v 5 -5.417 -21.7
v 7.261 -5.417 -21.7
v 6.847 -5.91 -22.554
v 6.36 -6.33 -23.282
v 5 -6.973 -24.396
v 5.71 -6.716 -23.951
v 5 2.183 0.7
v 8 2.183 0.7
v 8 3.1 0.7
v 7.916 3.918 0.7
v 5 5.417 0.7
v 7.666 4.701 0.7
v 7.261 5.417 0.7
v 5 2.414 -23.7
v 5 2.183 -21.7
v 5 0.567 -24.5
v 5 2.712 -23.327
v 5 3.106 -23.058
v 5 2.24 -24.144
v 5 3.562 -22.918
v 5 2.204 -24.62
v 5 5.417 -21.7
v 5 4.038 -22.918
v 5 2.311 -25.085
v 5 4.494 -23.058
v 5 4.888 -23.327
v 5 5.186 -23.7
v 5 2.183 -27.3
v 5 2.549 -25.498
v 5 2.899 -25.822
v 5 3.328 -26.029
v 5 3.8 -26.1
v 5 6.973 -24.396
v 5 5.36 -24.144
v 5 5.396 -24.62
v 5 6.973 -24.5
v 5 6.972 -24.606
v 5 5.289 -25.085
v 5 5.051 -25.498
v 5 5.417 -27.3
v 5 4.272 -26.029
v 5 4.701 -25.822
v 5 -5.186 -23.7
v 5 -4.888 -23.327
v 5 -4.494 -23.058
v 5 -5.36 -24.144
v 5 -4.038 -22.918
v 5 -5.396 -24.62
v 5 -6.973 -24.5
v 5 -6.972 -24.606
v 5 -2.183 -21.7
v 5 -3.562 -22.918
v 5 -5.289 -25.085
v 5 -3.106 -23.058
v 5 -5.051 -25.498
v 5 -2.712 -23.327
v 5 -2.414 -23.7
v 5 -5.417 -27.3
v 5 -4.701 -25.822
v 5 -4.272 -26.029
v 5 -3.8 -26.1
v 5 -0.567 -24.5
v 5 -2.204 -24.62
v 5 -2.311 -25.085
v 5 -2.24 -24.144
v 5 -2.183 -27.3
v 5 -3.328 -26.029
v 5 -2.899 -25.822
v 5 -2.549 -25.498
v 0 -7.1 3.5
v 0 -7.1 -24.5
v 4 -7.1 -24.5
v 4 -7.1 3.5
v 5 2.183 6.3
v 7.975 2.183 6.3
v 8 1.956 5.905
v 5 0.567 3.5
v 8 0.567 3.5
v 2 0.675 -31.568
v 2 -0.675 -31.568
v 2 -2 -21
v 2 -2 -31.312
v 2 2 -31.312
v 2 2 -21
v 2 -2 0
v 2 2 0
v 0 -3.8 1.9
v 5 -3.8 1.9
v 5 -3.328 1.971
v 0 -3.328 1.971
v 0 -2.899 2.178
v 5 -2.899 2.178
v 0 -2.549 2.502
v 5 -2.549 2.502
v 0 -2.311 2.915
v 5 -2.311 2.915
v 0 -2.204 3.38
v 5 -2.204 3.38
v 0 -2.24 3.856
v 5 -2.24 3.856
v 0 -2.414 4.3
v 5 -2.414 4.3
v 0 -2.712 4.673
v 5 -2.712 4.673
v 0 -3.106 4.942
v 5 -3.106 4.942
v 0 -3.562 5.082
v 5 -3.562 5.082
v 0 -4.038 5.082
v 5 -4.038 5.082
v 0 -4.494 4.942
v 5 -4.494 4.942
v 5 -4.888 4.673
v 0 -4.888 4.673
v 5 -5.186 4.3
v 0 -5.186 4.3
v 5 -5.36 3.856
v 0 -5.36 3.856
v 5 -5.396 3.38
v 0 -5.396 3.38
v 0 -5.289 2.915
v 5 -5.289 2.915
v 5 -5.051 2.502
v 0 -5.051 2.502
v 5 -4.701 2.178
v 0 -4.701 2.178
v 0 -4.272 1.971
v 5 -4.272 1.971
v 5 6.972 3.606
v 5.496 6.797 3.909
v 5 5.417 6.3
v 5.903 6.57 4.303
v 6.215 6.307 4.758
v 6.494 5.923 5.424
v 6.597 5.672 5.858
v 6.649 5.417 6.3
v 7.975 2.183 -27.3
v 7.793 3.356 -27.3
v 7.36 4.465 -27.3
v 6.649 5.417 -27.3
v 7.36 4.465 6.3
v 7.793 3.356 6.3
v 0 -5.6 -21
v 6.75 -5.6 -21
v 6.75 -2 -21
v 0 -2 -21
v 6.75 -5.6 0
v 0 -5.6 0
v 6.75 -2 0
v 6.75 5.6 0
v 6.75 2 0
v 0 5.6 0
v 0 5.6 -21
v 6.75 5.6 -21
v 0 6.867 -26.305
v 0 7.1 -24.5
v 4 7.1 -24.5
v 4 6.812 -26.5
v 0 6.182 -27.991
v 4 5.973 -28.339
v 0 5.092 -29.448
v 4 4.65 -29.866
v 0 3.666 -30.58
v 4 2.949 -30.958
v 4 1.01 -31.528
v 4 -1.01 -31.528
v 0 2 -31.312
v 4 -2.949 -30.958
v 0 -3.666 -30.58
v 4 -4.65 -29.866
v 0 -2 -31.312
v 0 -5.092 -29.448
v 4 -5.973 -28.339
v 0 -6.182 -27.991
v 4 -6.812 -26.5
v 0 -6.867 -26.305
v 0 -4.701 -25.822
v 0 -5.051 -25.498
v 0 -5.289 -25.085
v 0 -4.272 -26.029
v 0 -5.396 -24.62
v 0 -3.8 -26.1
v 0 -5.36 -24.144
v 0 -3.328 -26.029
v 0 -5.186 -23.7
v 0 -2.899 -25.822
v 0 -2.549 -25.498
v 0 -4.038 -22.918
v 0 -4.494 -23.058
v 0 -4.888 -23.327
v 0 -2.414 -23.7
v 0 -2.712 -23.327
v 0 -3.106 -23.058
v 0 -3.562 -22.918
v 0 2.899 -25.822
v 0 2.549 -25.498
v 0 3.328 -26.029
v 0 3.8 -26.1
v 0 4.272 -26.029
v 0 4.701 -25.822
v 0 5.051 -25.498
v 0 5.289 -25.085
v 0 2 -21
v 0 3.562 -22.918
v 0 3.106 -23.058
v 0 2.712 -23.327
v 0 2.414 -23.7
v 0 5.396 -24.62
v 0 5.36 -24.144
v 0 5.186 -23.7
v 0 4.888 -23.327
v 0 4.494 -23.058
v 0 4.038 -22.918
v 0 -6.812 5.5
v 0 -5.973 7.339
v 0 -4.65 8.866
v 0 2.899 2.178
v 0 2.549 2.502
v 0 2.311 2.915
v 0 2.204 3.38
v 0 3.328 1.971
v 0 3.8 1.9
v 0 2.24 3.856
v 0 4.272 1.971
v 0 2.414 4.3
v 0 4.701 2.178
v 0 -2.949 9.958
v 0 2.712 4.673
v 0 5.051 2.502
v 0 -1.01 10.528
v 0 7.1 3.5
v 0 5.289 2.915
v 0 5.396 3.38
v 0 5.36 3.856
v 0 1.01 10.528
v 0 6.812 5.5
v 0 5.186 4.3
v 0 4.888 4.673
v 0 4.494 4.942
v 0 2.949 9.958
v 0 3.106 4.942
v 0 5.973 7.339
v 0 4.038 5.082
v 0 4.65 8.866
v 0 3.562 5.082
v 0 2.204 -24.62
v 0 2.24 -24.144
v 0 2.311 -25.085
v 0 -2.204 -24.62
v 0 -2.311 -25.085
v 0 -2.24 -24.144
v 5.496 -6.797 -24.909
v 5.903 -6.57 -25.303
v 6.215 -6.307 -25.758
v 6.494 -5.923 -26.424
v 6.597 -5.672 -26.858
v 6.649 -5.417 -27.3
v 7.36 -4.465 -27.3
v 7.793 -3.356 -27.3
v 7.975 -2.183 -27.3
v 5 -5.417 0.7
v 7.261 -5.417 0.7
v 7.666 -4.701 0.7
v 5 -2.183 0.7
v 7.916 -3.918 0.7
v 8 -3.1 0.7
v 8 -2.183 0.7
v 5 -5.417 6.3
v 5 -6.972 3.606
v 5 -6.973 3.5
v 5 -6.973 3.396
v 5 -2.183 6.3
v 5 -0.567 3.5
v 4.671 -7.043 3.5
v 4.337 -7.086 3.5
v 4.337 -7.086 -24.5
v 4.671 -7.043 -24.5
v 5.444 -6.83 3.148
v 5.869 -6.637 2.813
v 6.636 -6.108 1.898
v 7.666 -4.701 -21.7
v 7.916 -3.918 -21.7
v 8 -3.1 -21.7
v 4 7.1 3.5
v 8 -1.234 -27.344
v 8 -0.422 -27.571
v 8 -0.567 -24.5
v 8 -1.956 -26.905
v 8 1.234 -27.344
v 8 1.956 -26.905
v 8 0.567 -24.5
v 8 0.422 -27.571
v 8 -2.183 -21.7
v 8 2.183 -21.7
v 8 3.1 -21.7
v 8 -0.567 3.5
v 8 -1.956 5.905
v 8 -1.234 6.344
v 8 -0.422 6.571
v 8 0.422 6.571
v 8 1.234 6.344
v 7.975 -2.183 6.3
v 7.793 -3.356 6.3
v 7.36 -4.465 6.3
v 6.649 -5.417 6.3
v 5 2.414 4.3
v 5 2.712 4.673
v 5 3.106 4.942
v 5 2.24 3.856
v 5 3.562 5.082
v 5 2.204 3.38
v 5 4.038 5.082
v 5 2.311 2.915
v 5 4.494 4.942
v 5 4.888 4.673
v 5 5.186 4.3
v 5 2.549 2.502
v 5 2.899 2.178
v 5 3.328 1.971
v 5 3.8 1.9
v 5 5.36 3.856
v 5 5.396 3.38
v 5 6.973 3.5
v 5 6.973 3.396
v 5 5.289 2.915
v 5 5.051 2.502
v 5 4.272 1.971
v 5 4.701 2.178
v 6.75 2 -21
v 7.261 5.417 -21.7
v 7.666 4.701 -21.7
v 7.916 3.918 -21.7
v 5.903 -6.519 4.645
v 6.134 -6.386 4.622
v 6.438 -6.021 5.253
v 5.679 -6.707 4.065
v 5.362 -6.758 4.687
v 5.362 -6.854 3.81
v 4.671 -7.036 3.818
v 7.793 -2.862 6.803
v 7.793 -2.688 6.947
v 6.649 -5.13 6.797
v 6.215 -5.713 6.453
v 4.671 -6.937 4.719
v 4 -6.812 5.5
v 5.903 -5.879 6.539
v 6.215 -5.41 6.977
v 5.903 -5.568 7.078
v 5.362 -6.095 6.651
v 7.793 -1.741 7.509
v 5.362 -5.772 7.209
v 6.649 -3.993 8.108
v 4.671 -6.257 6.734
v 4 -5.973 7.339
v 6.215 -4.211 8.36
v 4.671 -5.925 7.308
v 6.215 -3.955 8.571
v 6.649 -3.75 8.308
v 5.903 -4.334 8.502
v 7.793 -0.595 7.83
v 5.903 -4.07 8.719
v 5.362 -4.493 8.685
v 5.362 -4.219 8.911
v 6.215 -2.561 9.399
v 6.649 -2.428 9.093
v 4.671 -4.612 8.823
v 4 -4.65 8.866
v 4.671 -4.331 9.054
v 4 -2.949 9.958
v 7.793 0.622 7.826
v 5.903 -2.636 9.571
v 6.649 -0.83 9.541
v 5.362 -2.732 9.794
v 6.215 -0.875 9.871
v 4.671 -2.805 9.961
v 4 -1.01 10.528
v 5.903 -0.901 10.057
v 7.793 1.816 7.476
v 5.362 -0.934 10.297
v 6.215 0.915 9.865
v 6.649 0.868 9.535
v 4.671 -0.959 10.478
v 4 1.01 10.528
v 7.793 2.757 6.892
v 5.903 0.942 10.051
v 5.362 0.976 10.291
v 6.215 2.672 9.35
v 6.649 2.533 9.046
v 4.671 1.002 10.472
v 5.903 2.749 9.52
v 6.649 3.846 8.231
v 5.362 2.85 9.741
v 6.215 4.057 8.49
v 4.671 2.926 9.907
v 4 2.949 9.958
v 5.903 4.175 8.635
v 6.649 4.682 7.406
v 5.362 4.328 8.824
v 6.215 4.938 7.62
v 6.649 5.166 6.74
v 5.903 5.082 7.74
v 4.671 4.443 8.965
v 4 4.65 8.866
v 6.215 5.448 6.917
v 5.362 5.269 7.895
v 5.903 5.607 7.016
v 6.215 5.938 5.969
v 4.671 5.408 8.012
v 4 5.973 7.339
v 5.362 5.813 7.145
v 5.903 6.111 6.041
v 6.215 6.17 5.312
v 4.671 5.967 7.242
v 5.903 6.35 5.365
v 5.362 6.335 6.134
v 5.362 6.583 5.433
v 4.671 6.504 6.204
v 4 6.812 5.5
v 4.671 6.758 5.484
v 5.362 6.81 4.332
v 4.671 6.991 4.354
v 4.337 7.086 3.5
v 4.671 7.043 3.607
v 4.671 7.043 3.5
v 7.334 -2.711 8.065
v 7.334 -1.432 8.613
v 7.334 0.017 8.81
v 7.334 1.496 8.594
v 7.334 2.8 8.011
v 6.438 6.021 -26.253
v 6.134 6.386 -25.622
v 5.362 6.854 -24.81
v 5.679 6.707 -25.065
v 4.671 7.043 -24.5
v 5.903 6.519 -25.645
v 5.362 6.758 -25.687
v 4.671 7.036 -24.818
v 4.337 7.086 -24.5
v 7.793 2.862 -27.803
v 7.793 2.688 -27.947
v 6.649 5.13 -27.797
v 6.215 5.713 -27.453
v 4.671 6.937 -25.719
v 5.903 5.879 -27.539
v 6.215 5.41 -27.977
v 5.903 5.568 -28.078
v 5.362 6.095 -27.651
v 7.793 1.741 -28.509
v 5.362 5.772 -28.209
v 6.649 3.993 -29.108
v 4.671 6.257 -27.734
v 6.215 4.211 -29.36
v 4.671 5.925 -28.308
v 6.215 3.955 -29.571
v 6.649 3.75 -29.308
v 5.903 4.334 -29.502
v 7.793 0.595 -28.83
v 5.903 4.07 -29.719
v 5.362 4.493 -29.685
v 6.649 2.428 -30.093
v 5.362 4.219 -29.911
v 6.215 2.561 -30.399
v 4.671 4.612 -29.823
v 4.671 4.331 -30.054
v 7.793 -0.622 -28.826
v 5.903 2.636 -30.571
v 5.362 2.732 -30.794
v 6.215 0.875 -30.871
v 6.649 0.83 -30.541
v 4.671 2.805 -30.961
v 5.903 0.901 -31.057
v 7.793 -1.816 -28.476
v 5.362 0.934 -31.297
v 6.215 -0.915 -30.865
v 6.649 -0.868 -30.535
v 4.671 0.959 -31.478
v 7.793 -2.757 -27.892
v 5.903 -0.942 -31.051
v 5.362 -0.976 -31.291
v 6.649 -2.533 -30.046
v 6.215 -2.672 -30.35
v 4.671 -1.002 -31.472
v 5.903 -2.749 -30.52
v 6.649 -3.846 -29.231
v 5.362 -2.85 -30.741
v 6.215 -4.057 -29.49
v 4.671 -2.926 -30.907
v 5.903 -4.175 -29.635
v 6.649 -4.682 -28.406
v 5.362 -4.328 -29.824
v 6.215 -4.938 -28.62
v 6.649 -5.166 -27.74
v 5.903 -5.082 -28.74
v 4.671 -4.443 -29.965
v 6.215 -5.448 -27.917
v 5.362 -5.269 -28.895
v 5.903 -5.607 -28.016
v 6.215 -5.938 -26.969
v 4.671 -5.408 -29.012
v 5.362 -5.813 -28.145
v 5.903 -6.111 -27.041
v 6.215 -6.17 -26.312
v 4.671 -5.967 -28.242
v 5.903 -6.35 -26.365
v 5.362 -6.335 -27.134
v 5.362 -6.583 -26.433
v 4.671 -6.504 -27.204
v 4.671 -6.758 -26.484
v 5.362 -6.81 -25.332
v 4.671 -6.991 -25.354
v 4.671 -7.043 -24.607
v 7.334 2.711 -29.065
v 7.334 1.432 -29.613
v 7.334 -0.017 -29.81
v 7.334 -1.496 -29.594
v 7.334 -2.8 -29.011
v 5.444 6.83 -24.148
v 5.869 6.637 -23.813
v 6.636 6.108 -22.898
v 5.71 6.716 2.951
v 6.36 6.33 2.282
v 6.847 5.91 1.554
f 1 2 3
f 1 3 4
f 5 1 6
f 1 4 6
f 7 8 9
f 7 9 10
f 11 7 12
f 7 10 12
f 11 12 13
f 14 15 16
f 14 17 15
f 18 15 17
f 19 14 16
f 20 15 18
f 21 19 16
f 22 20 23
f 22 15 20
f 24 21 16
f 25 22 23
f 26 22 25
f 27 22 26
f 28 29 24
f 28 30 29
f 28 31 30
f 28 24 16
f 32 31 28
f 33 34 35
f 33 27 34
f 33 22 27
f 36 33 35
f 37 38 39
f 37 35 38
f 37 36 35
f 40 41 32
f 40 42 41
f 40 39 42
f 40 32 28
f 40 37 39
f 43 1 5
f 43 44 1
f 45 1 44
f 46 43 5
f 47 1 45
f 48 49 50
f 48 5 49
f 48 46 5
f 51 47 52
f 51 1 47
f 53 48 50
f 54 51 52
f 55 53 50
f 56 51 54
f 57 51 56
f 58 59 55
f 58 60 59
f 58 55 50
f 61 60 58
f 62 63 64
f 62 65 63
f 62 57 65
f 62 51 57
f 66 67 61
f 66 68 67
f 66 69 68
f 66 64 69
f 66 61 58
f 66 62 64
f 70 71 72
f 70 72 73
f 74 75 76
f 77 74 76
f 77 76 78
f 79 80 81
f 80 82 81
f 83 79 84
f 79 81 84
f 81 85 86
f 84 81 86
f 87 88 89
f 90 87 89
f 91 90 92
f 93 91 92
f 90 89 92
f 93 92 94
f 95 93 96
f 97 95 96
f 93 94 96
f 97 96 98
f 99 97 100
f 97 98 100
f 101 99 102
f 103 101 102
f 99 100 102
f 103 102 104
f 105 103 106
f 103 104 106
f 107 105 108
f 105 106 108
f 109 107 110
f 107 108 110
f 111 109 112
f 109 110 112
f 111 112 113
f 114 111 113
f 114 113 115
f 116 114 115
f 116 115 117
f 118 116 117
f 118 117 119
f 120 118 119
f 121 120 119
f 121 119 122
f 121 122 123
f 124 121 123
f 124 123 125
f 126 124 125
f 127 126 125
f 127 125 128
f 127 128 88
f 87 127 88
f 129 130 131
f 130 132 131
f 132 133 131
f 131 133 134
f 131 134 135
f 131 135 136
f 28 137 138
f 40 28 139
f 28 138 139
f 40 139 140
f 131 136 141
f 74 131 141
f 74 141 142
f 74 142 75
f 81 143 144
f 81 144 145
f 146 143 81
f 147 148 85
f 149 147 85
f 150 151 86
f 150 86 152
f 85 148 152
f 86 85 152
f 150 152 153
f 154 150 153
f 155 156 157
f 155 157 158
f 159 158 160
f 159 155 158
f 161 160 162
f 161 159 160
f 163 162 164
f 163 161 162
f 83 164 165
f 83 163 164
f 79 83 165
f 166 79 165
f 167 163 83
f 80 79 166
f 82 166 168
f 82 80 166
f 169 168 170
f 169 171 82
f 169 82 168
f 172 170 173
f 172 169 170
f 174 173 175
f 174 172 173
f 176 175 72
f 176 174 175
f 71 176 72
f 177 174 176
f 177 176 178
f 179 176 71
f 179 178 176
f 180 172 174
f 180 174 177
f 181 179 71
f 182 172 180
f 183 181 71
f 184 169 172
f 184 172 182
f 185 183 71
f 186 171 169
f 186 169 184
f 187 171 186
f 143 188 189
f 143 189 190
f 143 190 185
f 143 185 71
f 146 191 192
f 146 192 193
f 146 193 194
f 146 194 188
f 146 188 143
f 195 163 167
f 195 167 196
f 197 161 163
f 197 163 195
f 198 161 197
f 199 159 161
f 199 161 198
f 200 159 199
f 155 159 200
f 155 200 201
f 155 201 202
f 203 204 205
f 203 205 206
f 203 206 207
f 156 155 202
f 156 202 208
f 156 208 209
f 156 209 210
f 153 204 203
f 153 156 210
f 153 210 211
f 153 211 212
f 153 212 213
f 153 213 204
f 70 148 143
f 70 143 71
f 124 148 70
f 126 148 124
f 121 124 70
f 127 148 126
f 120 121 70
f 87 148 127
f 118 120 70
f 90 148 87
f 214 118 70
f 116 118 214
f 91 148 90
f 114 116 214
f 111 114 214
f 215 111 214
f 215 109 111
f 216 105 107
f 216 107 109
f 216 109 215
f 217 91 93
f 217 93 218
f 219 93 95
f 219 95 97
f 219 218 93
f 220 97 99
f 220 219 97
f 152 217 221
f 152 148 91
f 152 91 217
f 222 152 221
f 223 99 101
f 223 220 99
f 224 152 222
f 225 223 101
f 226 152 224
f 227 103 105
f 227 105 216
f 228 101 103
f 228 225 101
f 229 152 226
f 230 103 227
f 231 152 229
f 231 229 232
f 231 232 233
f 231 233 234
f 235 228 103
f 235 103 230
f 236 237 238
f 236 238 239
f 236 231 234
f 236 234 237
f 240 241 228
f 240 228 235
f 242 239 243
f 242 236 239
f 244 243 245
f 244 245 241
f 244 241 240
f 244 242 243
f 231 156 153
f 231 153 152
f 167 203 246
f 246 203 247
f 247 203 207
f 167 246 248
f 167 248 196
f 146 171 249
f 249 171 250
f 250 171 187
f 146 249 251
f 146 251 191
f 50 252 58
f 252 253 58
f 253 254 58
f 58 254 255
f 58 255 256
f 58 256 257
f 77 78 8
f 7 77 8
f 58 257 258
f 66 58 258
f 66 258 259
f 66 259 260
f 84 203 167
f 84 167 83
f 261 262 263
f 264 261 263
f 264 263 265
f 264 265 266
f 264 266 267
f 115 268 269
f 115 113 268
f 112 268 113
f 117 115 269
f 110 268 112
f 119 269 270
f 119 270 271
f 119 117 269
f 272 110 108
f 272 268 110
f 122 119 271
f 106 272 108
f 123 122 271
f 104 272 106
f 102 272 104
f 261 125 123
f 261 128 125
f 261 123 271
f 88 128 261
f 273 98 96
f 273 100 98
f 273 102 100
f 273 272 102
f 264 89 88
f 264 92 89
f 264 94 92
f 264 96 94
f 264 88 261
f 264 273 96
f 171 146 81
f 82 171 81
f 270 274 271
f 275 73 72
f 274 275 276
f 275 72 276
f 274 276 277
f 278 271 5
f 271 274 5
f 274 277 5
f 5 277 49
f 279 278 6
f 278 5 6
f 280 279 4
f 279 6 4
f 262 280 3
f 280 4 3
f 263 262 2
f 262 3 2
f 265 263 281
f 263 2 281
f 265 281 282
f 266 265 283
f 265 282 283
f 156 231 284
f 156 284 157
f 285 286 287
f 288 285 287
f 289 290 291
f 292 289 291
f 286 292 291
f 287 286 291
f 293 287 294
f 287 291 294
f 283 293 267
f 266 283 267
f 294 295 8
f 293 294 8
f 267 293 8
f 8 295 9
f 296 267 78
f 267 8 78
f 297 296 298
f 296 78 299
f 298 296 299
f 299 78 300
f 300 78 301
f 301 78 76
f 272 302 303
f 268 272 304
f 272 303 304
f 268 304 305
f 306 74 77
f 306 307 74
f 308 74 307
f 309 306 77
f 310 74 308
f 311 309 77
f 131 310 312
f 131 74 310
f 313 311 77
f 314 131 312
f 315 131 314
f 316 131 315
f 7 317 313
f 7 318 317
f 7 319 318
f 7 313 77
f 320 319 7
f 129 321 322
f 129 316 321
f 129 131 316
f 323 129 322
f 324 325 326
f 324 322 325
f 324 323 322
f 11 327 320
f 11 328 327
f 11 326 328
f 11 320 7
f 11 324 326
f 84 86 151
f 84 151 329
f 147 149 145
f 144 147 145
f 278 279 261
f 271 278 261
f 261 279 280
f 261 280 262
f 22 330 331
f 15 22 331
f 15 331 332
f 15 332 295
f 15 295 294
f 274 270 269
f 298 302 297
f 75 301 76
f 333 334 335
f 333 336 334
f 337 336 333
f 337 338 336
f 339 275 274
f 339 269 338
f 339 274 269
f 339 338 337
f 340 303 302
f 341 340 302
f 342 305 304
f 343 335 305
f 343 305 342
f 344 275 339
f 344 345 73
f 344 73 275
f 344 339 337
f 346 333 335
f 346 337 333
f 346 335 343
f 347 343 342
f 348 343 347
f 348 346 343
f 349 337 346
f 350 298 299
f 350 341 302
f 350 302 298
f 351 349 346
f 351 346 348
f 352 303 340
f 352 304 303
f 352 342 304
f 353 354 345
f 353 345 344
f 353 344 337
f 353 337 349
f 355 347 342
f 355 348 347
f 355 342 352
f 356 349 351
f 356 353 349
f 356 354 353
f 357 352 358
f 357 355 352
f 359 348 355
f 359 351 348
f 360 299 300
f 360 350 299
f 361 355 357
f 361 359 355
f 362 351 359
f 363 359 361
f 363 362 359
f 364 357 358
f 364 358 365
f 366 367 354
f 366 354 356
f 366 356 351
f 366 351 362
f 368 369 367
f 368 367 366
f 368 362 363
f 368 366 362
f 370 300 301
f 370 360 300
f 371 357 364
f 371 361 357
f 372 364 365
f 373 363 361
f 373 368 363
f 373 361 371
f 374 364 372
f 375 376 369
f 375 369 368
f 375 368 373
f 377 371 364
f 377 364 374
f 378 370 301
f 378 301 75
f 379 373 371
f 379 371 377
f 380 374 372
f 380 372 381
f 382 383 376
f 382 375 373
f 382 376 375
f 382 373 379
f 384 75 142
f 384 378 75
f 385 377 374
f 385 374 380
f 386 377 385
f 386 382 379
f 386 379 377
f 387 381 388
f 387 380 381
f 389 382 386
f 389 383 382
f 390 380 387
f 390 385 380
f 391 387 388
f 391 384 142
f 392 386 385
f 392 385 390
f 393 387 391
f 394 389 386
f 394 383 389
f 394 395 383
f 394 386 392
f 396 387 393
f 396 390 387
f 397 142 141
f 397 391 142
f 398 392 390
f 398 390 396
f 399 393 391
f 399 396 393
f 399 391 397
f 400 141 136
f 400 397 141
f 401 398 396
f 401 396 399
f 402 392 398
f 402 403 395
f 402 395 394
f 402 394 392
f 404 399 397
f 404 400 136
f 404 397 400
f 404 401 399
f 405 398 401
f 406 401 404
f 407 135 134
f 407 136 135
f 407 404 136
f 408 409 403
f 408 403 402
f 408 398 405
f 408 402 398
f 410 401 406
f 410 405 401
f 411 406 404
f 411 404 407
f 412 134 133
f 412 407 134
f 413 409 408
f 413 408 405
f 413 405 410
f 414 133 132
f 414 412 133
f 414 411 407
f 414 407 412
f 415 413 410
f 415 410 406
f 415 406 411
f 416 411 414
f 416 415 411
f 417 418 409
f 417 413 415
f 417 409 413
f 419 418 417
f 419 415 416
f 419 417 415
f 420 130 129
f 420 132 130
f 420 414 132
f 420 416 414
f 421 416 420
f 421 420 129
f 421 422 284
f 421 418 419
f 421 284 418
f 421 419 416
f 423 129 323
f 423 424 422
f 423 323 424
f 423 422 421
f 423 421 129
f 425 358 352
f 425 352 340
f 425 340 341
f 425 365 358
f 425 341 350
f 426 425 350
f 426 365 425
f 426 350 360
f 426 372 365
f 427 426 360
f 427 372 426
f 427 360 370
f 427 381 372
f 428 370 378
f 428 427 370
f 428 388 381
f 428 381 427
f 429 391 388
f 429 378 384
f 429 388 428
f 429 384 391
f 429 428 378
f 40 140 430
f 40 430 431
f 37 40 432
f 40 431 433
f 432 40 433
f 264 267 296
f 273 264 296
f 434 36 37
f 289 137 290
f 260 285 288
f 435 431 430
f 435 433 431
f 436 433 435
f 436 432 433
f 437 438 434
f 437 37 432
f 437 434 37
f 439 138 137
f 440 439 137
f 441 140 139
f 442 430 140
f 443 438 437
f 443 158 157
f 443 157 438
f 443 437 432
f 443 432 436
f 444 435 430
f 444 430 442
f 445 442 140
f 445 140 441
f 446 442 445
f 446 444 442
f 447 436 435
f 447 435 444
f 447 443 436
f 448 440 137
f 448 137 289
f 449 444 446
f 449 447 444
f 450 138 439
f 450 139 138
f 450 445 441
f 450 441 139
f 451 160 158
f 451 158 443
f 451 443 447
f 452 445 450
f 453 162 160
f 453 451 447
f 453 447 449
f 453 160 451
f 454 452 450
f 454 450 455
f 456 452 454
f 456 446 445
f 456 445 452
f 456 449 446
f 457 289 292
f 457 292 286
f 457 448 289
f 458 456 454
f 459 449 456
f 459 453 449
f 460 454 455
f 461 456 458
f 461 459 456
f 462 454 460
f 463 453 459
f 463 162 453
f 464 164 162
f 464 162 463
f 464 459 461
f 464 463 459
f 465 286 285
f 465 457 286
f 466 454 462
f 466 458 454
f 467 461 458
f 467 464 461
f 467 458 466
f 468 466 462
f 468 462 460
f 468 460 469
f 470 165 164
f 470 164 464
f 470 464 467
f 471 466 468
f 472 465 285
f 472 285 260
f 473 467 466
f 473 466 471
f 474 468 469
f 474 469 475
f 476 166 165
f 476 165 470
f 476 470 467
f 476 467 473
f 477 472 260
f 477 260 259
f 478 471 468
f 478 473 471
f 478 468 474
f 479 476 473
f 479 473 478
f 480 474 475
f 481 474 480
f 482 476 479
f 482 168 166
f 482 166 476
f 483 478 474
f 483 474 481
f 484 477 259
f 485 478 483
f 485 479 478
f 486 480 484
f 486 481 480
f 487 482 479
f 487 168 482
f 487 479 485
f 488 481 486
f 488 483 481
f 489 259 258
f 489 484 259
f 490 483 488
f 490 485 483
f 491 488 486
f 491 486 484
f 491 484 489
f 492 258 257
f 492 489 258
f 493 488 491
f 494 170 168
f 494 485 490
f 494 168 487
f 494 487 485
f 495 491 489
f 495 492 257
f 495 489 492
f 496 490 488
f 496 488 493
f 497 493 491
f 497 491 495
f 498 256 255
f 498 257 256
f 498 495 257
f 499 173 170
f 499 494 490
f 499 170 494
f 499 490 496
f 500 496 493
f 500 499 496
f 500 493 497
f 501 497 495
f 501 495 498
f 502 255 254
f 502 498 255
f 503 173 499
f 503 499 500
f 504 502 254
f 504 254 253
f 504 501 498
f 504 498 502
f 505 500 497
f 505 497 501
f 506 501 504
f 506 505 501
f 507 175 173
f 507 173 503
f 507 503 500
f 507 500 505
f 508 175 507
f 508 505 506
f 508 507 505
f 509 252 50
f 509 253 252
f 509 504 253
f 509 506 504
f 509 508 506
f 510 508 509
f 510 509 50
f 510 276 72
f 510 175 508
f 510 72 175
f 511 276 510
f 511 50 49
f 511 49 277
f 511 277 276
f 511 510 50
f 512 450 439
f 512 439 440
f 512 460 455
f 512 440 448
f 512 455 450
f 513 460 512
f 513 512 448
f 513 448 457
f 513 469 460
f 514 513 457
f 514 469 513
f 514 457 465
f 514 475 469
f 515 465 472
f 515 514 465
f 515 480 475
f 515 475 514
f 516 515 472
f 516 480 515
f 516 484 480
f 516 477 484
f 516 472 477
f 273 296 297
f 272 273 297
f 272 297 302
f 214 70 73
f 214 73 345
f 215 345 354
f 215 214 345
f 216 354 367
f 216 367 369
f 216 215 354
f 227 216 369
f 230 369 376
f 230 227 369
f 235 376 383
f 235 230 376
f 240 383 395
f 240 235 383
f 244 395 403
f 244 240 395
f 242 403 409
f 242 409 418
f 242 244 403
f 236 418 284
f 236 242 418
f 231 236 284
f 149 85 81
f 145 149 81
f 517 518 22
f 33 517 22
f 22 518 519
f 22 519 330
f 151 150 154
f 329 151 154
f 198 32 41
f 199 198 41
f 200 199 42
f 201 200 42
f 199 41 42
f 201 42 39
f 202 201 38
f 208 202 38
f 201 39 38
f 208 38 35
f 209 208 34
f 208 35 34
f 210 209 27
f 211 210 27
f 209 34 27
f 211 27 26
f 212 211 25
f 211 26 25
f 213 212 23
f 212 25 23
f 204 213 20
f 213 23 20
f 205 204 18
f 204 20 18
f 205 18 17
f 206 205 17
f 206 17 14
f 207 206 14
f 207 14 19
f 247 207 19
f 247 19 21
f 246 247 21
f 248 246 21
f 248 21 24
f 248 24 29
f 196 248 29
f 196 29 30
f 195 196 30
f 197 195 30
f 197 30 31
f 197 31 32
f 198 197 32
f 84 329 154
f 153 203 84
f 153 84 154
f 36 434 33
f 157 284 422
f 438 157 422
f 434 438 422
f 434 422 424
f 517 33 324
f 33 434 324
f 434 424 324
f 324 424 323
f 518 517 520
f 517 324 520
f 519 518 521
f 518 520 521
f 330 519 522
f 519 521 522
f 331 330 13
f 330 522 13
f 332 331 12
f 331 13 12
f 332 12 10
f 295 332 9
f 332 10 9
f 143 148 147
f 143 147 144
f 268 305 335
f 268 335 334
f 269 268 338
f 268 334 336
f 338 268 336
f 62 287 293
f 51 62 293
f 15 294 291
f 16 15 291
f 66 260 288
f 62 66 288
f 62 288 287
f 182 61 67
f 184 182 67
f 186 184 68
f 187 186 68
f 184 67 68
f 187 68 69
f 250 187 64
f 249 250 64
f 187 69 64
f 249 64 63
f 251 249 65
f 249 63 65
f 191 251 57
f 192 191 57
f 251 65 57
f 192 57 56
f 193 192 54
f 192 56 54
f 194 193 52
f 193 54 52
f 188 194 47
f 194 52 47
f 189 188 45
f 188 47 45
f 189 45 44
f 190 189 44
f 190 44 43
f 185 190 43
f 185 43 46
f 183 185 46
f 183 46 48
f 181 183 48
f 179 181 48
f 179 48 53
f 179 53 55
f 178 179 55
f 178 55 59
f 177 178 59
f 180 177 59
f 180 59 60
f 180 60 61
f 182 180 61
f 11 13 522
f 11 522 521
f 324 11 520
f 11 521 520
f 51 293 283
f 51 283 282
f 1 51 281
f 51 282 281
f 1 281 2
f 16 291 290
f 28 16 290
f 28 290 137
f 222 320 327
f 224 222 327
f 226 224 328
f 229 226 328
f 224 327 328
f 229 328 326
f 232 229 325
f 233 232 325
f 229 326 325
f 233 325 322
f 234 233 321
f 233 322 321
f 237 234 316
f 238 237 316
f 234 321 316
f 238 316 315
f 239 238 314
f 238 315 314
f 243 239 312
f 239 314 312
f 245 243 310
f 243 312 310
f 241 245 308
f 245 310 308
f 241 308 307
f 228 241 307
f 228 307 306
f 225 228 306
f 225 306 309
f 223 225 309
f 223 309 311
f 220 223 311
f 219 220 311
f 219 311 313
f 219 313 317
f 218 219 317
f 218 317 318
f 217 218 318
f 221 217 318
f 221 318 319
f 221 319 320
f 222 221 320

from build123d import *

# Parameters (mm, degrees)
BOSS_EXTRUDE1_DEPTH = 8
CUT_EXTRUDE5_REACH  = 35.361
SKETCH4_W           = 2
SKETCH4_H           = 4
SKETCH5_W           = 21
SKETCH5_H           = 3.6
CUT_EXTRUDE2_DEPTH  = 6.75
SKETCH6_R           = 1.6
CUT_EXTRUDE3_DEPTH  = 8
CUT_EXTRUDE4_DEPTH  = 3
FILLET1_R           = 4


with BuildPart() as part:
    # Sketch2 → Boss-Extrude1 (new body)
    with BuildSketch(Plane(origin=(0, 0, 0), x_dir=(0, 0, -1), z_dir=(1, 0, 0))):
        with BuildLine():
            Line((-3.5, 7.1), (24.5, 7.1))
            ThreePointArc((24.5, 7.1), (31.6, 0), (24.5, -7.1))
            Line((24.5, -7.1), (-3.5, -7.1))
            ThreePointArc((-3.5, -7.1), (-10.6, 0), (-3.5, 7.1))
        make_face()
    extrude(amount=BOSS_EXTRUDE1_DEPTH)

    # Sketch4 → Cut-Extrude5 (cut, up to next)
    with BuildSketch(Plane.XY, mode=Mode.PRIVATE) as cut_extrude5_sk1:
        with Locations((1, 0)):
            Rectangle(SKETCH4_W, SKETCH4_H)
    cut_extrude5_tool1 = extrude(cut_extrude5_sk1.sketch, amount=-CUT_EXTRUDE5_REACH, mode=Mode.PRIVATE) & part.part
    add(cut_extrude5_tool1.solids().sort_by_distance((1, 0, 0))[0], mode=Mode.SUBTRACT)

    # Sketch5 → Cut-Extrude2 (cut)
    with BuildSketch(Plane(origin=(0, 0, 0), x_dir=(0, 0, -1), z_dir=(1, 0, 0))):
        with Locations((10.5, 3.8)):
            Rectangle(SKETCH5_W, SKETCH5_H)
        with Locations((10.5, -3.8)):
            Rectangle(SKETCH5_W, SKETCH5_H)
    extrude(amount=CUT_EXTRUDE2_DEPTH, mode=Mode.SUBTRACT)

    # Sketch6 → Cut-Extrude3 (cut)
    with BuildSketch(Plane(origin=(8, 0, 0), x_dir=(0, 0, -1), z_dir=(1, 0, 0))):
        with Locations((-3.5, 3.8)):
            Circle(SKETCH6_R)
        with Locations((-3.5, -3.8)):
            Circle(SKETCH6_R)
        with Locations((24.5, 3.8)):
            Circle(SKETCH6_R)
        with Locations((24.5, -3.8)):
            Circle(SKETCH6_R)
    extrude(amount=-CUT_EXTRUDE3_DEPTH, mode=Mode.SUBTRACT)

    # Sketch7 → Cut-Extrude4 (cut)
    with BuildSketch(Plane(origin=(8, 0, 0), x_dir=(0, 0, -1), z_dir=(1, 0, 0))):
        Polygon((-0.7, 2.183419246), (-0.7, 5.416580754), (-3.5, 7.033161507), (-6.3, 5.416580754), (-6.3, 2.183419246), (-3.5, 0.566838493), align=None)
        Polygon((21.7, 5.416580754), (21.7, 2.183419246), (24.5, 0.566838493), (27.3, 2.183419246), (27.3, 5.416580754), (24.5, 7.033161507), align=None)
        Polygon((21.7, -2.183419246), (21.7, -5.416580754), (24.5, -7.033161507), (27.3, -5.416580754), (27.3, -2.183419246), (24.5, -0.566838493), align=None)
        Polygon((-3.5, -7.033161507), (-0.7, -5.416580754), (-0.7, -2.183419246), (-3.5, -0.566838493), (-6.3, -2.183419246), (-6.3, -5.416580754), align=None)
    extrude(amount=-CUT_EXTRUDE4_DEPTH, mode=Mode.SUBTRACT)

    # Fillet1
    # the kernel refuses this fillet: 4 mm, written as the material it takes off along each edge
    with BuildSketch(Plane(origin=(8, 7.1, 3.5), x_dir=(0, -1, 0), z_dir=(0, 0, -1))) as fillet1_piece_1:
        with BuildLine():
            CenterArc((FILLET1_R, FILLET1_R), FILLET1_R, 180, 90)
            Line((0, FILLET1_R), (0, 0))
            Line((0, 0), (FILLET1_R, 0))
        make_face()
    extrude(amount=28, mode=Mode.SUBTRACT)
    with BuildSketch(Plane(origin=(8, 0, -24.5), x_dir=(0, 1, 0), z_dir=(0, 0, 1))) as fillet1_piece_2:
        with BuildLine():
            CenterArc((7.1 - FILLET1_R, FILLET1_R), FILLET1_R, 270, 90)
            Line((7.1 - FILLET1_R, 0), (7.1, 0))
            Line((7.1, 0), (7.1, FILLET1_R))
        make_face()
    revolve(axis=Axis((8, 0, -24.5), (-1, 0, 0)), revolution_arc=180, mode=Mode.SUBTRACT)
    with BuildSketch(Plane(origin=(8, -7.1, -24.5), x_dir=(-1, 0, 0), z_dir=(0, 0, 1))) as fillet1_piece_3:
        with BuildLine():
            CenterArc((FILLET1_R, -FILLET1_R), FILLET1_R, 90, 90)
            Line((0, -FILLET1_R), (0, 0))
            Line((0, 0), (FILLET1_R, 0))
        make_face()
    extrude(amount=28, mode=Mode.SUBTRACT)
    with BuildSketch(Plane(origin=(8, 0, 3.5), x_dir=(0, -1, 0), z_dir=(0, 0, -1))) as fillet1_piece_4:
        with BuildLine():
            CenterArc((7.1 - FILLET1_R, FILLET1_R), FILLET1_R, 270, 90)
            Line((7.1, FILLET1_R), (7.1, 0))
            Line((7.1, 0), (7.1 - FILLET1_R, 0))
        make_face()
    revolve(axis=Axis((8, 0, 3.5), (-1, 0, 0)), revolution_arc=180, mode=Mode.SUBTRACT)


solid = part.part
